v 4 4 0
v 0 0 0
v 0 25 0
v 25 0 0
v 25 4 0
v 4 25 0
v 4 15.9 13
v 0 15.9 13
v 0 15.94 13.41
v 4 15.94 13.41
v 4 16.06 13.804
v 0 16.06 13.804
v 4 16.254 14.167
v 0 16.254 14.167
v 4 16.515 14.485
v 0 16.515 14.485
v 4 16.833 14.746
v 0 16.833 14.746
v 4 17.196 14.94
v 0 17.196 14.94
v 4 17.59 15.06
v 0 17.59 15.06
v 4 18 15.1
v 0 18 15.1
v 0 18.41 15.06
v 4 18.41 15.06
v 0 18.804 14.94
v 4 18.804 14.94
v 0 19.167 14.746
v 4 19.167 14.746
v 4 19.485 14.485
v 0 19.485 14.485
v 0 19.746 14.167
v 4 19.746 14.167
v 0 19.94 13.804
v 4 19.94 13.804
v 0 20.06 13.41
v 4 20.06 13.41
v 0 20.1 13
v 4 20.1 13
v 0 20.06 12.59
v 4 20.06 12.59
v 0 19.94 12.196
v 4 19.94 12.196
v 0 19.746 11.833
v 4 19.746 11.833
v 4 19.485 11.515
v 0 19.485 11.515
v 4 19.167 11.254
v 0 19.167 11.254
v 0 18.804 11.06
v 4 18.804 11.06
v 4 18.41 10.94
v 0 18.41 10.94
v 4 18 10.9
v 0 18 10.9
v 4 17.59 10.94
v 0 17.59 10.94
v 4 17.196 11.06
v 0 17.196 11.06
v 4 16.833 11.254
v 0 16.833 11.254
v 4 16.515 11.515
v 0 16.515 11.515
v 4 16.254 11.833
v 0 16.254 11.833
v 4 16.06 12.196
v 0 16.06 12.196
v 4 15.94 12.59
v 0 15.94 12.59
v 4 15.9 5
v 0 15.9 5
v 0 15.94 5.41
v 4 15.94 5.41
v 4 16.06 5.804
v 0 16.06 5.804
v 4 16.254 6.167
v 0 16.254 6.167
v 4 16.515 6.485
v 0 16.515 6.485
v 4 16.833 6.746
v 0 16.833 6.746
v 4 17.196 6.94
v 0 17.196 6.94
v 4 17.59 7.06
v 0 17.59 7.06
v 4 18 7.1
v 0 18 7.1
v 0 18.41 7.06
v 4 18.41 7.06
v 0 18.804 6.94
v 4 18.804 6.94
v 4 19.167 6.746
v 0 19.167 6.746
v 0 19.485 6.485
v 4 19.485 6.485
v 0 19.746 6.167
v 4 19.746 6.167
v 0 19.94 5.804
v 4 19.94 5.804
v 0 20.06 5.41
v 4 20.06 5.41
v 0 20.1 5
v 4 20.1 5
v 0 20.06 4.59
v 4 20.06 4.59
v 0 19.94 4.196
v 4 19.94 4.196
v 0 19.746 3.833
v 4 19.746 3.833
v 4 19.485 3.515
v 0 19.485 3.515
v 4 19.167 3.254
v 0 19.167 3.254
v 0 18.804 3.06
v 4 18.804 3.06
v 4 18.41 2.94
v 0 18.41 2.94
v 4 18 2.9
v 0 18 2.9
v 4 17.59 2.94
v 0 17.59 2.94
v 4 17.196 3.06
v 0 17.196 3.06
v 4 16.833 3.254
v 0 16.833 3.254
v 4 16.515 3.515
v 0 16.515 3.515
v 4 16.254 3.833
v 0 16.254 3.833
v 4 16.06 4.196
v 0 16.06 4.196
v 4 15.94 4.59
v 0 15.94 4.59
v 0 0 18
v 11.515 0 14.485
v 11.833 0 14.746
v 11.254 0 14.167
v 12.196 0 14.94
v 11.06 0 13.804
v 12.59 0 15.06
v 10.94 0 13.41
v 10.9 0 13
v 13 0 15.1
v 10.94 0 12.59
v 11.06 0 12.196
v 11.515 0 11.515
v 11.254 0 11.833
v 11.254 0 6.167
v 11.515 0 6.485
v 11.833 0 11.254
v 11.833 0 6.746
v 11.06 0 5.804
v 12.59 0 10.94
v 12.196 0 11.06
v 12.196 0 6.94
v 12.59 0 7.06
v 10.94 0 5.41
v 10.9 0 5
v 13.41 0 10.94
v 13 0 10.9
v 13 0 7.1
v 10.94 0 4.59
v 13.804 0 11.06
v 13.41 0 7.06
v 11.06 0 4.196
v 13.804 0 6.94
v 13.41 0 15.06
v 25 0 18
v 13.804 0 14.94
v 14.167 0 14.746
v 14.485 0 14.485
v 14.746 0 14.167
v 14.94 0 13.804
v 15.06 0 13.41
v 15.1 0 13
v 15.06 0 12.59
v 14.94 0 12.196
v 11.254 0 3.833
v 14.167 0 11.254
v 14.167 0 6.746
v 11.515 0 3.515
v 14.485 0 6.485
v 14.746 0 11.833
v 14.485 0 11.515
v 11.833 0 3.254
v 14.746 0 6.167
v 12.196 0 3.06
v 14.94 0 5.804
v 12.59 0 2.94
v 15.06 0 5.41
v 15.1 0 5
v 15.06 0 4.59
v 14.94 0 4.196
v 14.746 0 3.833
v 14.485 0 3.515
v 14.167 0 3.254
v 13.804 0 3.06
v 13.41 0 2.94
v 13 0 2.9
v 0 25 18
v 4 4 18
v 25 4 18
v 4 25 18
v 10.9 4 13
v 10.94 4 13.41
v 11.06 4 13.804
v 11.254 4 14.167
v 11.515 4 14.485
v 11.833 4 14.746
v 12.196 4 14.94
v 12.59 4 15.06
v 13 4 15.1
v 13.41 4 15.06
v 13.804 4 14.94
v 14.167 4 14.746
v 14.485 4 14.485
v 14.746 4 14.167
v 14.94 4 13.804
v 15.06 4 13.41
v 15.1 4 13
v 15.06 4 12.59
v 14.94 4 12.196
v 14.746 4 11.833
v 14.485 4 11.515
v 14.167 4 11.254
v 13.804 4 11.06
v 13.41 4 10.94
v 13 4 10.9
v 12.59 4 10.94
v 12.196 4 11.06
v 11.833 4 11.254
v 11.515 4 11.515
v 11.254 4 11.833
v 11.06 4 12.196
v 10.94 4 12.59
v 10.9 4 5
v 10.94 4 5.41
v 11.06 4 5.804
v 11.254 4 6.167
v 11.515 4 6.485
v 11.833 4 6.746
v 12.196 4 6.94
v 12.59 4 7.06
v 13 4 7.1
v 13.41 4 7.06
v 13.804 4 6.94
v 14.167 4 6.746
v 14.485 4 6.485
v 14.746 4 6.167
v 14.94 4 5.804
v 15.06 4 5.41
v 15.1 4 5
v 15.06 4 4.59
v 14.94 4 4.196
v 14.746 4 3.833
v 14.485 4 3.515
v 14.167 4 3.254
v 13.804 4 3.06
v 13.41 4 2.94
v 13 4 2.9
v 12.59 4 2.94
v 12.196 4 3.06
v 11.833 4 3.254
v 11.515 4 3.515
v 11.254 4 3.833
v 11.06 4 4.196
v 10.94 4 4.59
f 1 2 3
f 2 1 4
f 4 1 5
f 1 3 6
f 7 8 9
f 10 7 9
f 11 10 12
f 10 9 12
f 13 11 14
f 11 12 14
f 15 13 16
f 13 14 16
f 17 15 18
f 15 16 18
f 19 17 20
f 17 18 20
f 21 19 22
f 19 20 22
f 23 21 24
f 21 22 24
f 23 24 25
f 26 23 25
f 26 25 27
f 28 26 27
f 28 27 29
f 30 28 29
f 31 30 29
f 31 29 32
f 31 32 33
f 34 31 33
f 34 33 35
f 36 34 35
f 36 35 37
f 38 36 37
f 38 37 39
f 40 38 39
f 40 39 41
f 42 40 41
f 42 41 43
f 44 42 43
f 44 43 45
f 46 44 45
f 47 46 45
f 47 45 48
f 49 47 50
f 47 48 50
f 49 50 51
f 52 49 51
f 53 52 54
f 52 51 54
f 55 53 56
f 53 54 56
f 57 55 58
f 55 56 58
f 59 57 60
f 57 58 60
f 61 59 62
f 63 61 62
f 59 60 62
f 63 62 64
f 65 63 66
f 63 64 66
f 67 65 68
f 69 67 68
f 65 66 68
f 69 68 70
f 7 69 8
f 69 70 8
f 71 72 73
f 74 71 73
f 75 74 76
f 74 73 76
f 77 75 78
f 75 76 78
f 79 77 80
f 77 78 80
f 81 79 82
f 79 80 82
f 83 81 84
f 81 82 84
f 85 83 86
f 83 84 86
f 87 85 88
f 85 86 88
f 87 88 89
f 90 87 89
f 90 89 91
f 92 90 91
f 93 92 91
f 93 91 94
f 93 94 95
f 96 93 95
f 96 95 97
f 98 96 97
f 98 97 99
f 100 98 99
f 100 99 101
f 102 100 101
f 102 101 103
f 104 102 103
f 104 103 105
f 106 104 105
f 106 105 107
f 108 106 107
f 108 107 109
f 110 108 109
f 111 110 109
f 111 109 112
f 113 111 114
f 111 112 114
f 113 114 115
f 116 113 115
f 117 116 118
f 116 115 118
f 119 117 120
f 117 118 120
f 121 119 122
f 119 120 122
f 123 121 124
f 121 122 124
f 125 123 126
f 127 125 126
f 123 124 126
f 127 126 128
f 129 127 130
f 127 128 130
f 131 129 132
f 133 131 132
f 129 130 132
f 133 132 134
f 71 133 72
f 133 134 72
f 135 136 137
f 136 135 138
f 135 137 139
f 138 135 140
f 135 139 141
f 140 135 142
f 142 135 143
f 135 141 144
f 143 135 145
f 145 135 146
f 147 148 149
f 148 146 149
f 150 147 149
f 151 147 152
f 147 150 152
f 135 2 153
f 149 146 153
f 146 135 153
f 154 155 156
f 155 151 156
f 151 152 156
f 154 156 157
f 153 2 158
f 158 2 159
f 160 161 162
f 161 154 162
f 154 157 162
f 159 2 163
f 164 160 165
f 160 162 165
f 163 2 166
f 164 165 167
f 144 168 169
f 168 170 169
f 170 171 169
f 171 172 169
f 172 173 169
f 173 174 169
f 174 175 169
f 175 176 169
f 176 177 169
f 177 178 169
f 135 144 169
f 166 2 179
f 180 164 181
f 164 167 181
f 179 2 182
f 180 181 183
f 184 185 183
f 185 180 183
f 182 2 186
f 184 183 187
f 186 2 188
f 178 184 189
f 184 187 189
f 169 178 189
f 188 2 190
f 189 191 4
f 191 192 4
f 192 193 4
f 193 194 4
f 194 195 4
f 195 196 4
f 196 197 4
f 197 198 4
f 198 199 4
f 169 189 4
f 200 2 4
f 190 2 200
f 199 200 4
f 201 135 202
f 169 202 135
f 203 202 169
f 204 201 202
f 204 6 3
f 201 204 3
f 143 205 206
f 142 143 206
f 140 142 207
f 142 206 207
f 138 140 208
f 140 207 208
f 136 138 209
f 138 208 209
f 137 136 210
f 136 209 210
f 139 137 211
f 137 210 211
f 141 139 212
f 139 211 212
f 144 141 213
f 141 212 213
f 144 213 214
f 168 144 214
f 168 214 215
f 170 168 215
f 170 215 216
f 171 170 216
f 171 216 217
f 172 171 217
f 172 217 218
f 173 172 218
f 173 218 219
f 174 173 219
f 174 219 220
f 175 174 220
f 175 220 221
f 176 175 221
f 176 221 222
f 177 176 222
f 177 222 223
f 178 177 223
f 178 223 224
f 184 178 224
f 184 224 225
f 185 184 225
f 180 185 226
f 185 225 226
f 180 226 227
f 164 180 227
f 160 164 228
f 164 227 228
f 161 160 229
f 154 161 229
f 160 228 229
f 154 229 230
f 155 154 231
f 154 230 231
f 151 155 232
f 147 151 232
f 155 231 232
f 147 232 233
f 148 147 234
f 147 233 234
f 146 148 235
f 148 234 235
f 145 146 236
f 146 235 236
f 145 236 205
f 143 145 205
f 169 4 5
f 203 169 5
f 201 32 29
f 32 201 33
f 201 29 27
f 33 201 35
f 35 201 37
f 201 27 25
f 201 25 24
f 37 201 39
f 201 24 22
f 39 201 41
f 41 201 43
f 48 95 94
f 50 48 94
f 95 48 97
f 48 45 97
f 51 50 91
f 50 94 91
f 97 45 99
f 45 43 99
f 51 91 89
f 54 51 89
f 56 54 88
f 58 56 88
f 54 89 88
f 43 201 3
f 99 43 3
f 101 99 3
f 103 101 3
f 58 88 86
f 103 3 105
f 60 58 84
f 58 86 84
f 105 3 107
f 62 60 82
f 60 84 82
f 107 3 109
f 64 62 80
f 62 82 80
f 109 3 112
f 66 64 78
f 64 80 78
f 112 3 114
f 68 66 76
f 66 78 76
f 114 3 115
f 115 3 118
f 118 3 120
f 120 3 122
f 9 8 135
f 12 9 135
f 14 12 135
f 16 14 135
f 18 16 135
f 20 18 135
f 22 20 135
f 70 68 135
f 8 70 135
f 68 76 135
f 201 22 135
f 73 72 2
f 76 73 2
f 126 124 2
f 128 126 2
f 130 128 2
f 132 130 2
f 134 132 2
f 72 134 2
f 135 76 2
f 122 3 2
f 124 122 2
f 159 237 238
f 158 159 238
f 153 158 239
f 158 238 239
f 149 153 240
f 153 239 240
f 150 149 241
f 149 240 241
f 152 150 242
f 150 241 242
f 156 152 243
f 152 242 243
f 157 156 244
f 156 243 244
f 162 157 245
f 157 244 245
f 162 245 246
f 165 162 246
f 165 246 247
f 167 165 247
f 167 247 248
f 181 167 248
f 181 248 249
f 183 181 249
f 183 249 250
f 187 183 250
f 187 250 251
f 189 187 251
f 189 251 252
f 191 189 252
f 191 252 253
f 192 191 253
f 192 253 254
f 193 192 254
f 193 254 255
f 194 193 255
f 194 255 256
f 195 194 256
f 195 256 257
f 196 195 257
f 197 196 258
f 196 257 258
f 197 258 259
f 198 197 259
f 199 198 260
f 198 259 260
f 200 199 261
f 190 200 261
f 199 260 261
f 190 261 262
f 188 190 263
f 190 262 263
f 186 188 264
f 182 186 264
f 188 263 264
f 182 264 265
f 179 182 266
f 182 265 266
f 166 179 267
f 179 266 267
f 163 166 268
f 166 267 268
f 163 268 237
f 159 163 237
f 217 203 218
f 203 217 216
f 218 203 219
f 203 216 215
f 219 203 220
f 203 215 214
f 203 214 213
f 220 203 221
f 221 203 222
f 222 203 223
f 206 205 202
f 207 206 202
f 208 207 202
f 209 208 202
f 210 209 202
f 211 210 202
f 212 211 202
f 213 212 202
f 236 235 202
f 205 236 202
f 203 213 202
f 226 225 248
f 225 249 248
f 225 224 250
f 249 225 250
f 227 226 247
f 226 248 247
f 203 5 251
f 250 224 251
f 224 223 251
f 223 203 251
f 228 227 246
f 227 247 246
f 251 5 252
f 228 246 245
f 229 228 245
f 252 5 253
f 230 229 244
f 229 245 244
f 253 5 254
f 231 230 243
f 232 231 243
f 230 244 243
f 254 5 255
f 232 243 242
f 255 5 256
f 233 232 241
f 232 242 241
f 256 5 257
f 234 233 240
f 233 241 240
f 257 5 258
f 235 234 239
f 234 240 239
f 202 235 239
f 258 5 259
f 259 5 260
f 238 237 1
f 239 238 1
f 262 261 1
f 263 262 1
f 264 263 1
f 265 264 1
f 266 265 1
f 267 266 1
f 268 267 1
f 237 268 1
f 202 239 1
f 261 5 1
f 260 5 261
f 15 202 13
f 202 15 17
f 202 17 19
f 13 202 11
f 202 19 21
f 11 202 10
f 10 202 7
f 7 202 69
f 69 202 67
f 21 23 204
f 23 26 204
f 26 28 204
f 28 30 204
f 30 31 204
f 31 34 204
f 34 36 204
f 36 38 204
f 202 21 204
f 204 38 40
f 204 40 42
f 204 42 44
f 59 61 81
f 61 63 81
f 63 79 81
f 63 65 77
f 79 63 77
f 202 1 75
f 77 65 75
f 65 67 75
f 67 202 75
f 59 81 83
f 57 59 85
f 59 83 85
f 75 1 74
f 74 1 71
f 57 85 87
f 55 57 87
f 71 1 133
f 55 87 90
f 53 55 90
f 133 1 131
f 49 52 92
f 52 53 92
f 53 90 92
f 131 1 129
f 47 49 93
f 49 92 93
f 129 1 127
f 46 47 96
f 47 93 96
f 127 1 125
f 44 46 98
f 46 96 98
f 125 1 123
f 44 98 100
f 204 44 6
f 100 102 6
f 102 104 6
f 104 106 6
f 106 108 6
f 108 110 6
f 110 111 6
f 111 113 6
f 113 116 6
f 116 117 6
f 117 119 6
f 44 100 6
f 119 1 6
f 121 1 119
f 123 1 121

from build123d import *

# Parameters (mm, degrees)
EXTRUDE_1_DEPTH     = 18
SKETCH_4_R          = 2.1
CUT_EXTRUDE_3_DEPTH = 38
SKETCH_5_R          = 2.1
CUT_EXTRUDE_4_DEPTH = 38


with BuildPart() as part:
    # 草图1 → 凸台-拉伸1 (new body)
    with BuildSketch(Plane.XY):
        Polygon((0, 25), (0, 0), (25, 0), (25, 4), (4, 4), (4, 25), align=None)
    extrude(amount=EXTRUDE_1_DEPTH)

    # 草图4 → 切除-拉伸3 (cut)
    with BuildSketch(Plane(origin=(0, 4, 0), x_dir=(1, 0, 0), z_dir=(0, 1, 0))):
        with Locations(Location((13, -5, 0), (0, 0, 180))):
            Circle(SKETCH_4_R)
        with Locations(Location((13, -13, 0), (0, 0, 180))):
            Circle(SKETCH_4_R)
    extrude(amount=-CUT_EXTRUDE_3_DEPTH, mode=Mode.SUBTRACT)

    # 草图5 → 切除-拉伸4 (cut)
    with BuildSketch(Plane.ZY):
        with Locations(Location((5, 18, 0), (0, 0, 270))):
            Circle(SKETCH_5_R)
        with Locations(Location((13, 18, 0), (0, 0, 270))):
            Circle(SKETCH_5_R)
    extrude(amount=-CUT_EXTRUDE_4_DEPTH, mode=Mode.SUBTRACT)


solid = part.part
